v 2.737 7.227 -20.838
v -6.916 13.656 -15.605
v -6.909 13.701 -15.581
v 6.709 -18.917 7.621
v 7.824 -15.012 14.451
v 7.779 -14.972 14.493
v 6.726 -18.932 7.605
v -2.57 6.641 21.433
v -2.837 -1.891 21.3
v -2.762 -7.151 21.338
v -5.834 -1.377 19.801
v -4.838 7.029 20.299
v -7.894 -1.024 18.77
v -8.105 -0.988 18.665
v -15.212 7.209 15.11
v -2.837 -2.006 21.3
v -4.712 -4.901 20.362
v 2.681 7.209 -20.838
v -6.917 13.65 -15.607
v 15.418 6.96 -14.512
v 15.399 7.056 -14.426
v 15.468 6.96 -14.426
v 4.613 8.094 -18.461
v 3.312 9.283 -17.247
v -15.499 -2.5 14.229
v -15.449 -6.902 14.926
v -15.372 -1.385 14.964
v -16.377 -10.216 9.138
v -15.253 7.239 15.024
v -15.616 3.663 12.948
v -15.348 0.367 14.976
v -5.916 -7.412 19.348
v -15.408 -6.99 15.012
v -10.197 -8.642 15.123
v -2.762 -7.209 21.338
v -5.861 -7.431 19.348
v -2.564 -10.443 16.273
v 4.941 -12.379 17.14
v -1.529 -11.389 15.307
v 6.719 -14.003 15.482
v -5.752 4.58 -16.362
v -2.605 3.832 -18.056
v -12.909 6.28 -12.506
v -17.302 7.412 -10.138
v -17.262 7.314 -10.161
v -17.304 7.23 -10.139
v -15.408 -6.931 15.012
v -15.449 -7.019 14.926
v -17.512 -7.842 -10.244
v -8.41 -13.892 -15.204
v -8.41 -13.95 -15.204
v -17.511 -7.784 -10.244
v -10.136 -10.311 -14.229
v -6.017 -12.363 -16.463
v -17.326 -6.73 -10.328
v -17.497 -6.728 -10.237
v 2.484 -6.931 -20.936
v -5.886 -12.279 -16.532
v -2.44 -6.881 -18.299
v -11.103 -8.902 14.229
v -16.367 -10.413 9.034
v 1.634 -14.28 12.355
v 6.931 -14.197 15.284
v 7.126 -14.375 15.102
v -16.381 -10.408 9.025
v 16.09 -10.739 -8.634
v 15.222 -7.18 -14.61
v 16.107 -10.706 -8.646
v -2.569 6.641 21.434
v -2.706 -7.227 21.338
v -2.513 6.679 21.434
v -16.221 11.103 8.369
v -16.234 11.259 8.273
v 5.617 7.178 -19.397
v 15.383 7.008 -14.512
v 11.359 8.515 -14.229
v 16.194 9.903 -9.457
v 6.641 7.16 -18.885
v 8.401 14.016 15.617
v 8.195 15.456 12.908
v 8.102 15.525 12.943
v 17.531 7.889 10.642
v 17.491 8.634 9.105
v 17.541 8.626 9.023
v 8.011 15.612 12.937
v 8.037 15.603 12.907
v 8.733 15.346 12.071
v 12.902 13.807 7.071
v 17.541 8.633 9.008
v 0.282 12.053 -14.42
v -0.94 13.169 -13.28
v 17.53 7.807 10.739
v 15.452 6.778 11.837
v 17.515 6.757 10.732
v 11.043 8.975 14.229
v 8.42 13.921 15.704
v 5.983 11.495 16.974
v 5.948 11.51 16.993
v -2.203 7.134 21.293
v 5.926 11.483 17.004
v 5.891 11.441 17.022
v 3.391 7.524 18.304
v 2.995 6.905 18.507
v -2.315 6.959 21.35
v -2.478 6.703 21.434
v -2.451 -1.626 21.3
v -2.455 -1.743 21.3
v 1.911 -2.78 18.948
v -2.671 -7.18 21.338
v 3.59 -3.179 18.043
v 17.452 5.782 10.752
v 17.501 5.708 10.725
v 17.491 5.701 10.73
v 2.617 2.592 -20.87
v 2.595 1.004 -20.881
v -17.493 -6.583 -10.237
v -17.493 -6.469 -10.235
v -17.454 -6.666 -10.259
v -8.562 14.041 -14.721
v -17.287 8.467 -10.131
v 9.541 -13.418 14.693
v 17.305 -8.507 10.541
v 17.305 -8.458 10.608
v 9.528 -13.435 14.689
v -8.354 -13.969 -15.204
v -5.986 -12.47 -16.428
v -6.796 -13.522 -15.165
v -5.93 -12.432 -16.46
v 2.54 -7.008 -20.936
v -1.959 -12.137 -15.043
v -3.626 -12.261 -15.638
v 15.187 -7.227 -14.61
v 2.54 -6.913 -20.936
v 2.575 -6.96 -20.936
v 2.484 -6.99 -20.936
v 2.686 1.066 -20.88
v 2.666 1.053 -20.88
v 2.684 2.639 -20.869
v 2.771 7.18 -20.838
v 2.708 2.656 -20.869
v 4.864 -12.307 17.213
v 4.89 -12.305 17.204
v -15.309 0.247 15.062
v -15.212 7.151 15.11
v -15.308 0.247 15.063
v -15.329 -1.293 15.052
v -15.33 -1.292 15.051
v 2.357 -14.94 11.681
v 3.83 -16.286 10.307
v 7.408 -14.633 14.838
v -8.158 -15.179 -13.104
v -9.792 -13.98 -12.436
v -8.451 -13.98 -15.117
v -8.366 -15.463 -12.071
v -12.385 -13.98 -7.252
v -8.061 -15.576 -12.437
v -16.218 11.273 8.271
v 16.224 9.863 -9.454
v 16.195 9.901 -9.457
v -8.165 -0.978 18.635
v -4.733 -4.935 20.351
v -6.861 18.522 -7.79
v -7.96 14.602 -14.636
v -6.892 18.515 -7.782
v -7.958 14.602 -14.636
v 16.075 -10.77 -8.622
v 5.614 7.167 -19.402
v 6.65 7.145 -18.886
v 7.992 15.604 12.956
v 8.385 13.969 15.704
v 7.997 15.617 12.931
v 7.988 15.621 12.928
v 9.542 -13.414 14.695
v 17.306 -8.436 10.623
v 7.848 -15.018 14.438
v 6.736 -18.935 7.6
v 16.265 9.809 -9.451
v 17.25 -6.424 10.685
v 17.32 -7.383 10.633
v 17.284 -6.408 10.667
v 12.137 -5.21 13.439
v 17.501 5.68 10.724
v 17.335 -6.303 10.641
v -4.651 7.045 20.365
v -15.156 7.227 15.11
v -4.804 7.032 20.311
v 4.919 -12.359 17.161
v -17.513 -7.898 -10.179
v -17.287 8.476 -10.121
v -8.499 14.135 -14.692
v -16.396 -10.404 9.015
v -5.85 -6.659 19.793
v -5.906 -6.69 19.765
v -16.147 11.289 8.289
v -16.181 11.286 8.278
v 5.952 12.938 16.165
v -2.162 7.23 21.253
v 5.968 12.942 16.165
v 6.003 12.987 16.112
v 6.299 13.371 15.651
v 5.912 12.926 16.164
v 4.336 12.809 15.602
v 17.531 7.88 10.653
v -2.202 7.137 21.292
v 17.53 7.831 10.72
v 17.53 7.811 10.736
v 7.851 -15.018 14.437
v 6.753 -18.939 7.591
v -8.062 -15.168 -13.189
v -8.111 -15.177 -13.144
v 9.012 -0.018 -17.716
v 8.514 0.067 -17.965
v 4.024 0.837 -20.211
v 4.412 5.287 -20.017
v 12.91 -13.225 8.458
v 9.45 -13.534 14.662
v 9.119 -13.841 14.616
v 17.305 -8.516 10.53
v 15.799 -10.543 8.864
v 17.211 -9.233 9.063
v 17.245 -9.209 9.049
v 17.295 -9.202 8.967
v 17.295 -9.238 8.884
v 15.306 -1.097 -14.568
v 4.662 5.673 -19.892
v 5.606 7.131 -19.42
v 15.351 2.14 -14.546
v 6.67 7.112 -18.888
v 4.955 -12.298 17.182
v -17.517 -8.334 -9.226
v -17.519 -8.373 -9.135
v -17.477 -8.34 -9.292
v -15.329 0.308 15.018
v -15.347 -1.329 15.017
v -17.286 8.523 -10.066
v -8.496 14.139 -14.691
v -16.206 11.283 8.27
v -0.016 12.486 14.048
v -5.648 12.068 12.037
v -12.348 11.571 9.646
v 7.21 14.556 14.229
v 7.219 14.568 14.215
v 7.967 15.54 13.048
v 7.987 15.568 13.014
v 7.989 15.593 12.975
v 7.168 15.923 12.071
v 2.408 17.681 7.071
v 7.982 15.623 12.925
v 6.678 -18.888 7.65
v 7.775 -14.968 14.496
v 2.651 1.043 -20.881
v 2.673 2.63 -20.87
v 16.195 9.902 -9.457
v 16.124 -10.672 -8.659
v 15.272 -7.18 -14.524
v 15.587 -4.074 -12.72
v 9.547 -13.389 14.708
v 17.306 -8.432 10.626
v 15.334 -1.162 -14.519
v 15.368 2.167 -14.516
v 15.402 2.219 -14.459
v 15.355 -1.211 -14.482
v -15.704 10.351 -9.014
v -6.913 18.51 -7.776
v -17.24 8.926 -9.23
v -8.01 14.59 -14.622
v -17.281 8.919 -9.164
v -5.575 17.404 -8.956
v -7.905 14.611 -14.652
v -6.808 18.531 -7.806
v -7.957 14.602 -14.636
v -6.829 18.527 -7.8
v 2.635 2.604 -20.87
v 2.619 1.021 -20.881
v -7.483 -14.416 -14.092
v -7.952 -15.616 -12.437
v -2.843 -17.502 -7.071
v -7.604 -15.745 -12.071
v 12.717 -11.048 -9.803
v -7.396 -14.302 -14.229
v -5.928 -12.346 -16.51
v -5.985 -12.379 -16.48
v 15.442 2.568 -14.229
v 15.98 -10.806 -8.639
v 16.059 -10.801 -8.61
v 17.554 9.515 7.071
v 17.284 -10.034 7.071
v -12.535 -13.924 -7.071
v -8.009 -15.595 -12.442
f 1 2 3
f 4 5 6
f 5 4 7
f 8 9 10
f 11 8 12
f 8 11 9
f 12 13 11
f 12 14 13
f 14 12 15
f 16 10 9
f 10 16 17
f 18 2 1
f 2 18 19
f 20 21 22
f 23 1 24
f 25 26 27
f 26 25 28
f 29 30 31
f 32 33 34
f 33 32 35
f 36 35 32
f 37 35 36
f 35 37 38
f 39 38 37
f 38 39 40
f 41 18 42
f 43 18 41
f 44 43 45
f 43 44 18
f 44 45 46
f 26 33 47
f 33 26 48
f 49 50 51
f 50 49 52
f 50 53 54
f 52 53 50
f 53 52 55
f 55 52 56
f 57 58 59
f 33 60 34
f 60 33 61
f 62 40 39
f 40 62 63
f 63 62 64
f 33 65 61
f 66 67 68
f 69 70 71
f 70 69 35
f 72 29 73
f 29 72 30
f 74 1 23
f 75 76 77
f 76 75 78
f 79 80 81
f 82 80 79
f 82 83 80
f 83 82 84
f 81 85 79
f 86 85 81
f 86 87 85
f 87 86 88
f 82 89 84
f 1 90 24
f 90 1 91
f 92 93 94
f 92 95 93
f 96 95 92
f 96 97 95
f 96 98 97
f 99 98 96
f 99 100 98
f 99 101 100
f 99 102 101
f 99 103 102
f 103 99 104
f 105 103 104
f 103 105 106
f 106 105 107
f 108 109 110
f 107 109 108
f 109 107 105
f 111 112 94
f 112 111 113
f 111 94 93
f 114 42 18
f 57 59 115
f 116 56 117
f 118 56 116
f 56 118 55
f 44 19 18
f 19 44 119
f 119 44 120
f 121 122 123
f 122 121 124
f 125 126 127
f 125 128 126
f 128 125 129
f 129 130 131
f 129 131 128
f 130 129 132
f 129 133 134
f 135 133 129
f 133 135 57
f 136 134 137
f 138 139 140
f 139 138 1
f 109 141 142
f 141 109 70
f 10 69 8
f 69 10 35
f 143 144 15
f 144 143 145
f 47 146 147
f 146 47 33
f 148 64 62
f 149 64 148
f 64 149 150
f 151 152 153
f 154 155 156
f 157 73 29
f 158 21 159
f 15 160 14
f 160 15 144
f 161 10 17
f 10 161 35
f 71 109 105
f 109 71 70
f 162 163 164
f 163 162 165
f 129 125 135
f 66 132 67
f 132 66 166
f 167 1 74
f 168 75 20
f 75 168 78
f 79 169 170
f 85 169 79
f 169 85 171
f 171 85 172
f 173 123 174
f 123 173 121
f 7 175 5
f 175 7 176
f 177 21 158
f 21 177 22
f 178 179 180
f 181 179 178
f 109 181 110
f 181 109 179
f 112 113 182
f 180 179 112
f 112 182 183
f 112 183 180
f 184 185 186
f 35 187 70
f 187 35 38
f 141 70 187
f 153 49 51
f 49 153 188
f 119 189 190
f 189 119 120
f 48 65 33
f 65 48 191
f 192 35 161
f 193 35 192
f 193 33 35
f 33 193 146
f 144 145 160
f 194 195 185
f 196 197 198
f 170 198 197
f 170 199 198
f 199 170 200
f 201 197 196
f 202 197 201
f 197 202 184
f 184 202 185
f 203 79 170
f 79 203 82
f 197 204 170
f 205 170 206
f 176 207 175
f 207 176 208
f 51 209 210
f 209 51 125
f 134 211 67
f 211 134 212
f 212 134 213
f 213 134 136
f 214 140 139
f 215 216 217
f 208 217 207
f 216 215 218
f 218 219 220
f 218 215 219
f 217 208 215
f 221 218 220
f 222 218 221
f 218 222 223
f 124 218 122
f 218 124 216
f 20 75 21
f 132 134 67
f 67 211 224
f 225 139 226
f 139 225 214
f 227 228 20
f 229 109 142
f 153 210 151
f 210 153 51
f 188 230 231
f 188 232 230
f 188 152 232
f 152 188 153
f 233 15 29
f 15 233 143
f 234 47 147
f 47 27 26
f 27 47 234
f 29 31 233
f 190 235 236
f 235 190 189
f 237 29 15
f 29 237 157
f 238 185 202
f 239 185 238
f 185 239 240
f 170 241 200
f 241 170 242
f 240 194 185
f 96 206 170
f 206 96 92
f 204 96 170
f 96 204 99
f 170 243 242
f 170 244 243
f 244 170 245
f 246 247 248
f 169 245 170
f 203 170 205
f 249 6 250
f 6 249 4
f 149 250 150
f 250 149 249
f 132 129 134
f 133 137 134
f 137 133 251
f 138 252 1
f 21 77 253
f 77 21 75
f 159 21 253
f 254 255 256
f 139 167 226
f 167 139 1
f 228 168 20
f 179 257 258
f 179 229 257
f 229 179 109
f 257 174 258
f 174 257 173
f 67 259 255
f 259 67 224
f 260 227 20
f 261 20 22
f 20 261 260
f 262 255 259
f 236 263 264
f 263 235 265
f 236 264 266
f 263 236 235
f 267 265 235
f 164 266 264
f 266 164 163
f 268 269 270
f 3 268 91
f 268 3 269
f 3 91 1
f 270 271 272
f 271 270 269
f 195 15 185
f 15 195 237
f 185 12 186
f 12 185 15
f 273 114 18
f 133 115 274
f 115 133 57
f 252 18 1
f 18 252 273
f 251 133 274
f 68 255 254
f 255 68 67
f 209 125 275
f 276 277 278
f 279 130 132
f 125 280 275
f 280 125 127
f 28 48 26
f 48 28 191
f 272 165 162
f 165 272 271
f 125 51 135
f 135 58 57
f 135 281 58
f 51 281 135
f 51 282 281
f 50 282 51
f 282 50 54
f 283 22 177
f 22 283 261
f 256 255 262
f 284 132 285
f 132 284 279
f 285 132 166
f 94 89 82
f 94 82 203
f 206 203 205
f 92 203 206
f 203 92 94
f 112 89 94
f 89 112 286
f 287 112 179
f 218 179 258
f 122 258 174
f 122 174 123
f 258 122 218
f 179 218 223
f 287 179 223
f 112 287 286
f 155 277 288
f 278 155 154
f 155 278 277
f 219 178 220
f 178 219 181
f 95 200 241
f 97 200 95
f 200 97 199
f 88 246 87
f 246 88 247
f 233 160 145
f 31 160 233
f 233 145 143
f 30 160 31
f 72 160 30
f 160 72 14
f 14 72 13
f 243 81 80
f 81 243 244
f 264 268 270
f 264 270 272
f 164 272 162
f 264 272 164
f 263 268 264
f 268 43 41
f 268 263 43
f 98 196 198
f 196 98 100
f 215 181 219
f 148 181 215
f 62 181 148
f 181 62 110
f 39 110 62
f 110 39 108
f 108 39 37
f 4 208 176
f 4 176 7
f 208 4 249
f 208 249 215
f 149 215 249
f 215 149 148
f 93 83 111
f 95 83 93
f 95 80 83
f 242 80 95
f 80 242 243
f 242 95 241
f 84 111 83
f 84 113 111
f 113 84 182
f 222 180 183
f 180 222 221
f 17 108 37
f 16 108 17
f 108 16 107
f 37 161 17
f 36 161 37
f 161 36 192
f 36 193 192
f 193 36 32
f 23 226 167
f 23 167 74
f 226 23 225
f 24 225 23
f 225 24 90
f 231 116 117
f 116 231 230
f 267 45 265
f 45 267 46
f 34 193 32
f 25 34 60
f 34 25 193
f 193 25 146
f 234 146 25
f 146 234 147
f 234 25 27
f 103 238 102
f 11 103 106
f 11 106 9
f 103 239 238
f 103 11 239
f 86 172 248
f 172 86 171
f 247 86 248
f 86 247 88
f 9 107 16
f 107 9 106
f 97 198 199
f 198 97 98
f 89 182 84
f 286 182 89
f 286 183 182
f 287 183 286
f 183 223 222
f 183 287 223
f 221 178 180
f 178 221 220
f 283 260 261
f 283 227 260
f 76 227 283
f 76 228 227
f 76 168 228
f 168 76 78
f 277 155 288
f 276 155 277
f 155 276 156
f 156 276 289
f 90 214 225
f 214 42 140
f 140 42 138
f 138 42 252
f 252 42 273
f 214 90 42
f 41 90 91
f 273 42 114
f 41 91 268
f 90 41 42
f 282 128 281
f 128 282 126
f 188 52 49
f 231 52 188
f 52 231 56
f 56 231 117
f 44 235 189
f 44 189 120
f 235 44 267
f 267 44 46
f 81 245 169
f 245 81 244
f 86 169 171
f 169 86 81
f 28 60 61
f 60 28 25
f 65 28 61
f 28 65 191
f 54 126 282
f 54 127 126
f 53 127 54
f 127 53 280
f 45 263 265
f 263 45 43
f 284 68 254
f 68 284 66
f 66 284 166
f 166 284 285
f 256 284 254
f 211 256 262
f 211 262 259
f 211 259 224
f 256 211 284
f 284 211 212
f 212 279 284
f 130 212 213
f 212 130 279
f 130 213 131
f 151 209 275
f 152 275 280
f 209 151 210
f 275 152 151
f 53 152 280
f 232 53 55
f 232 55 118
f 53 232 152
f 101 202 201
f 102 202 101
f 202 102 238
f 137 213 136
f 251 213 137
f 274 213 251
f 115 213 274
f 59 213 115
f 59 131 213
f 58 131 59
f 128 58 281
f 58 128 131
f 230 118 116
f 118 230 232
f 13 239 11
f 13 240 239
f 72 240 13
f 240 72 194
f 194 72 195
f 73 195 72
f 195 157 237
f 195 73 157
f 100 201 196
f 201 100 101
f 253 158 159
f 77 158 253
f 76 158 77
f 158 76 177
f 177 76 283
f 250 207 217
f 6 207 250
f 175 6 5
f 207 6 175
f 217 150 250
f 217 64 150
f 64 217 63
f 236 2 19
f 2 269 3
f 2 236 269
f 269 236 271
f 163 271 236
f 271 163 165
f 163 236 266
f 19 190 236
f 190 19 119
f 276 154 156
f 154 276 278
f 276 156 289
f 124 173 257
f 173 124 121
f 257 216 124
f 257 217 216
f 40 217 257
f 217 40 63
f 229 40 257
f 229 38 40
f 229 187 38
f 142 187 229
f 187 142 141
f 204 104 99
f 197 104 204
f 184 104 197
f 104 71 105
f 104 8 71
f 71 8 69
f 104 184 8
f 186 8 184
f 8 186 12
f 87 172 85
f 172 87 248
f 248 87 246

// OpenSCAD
// Auto-generated OpenSCAD file

    shift = 0.25;

    inner_points = 10*[[-1.7318858006234514, 0.023907605455431507, -1.4142135623731846], [-1.714980570684405, 1.2485357993167547, -0.7071067811861695], [-1.7487910305625782, -1.2007205884064303, -0.7071067811871046], [-1.7149805706844856, 1.248535799316216, 0.7071067811869255], [-1.748791030562659, -1.2007205884069694, 0.7071067811859905], [-1.7318858006236126, 0.023907605454353924, 1.4142135623730054], [-0.5998355734598786, -1.6248683899966199, -1.4142135623737482], [-0.5491198836427398, 2.04901619158735, 0.7071067811872969], [-0.5829303435207519, -0.4002401961347579, -2.1213203435598285], [-0.5491198836426593, 2.0490161915878886, -0.7071067811857982], [-0.5829303435209935, -0.40024019613637424, 2.1213203435594568], [-0.5998355734600398, -1.6248683899976974, 1.414213562372442], [0.599835573459879, 1.6248683899966216, 1.4142135623737482], [0.5491198836427402, -2.049016191587348, -0.7071067811872969], [0.5829303435207523, 0.4002401961347596, 2.1213203435598285], [0.5491198836426597, -2.049016191587887, 0.7071067811857982], [0.5829303435209939, 0.4002401961363759, -2.1213203435594568], [0.5998355734600402, 1.6248683899976992, -1.414213562372442], [1.7318858006234519, -0.023907605455429876, 1.4142135623731846], [1.7149805706844055, -1.248535799316753, 0.7071067811861695], [1.7487910305625787, 1.200720588406432, 0.7071067811871046], [1.714980570684486, -1.2485357993162143, -0.7071067811869255], [1.7487910305626595, 1.2007205884069712, -0.7071067811859905], [1.731885800623613, -0.023907605454352294, -1.4142135623730054]];

    outer_points_unshifted = 10*[[1.8872103946003194, -0.7399369194726597, 0.9438910327542147], [1.906836077173567, 0.674106390466402, 0.9537068465318261], [1.6923784357468117, -1.4359868196078143, -0.27165618736154307], [1.7316298008933075, 1.392099800270309, -0.2520245598063201], [1.517172159466552, -0.7179934098039071, -1.4773875936996894], [1.5367978420398, 0.6960499001351546, -1.467571779922078], [0.602902554769109, -2.1320367197429686, 0.3015425925479229], [0.661779602488853, 2.1100932100742162, 0.33099003388075743], [0.7977345136226167, -1.4359868196078143, 1.5170898126636807], [0.8369858787691128, 1.392099800270309, 1.5367214402189036], [0.2721156847818378, 0.7179934098039071, -2.1001044063507583], [0.25249000220858975, -0.6960499001351546, -2.1099202201283696], [-0.602902554769109, 2.1320367197429686, -0.3015425925479229], [-0.661779602488853, -2.1100932100742162, -0.33099003388075743], [-0.7977345136226167, 1.4359868196078143, -1.5170898126636807], [-0.8369858787691128, -1.392099800270309, -1.5367214402189036], [-0.2721156847818378, -0.7179934098039071, 2.1001044063507583], [-0.25249000220858975, 0.6960499001351546, 2.1099202201283696], [-1.8872103946003194, 0.7399369194726597, -0.9438910327542147], [-1.906836077173567, -0.674106390466402, -0.9537068465318261], [-1.6923784357468117, 1.4359868196078143, 0.27165618736154307], [-1.7316298008933075, -1.392099800270309, 0.2520245598063201], [-1.517172159466552, 0.7179934098039071, 1.4773875936996894], [-1.5367978420398, -0.6960499001351546, 1.467571779922078]];
    
    outer_points = [for (p = outer_points_unshifted) [p[0], p[1], p[2] + shift]];

    // Convex hull for inner set (I)
    module inner_hull() {
        hull() {
            for (p = inner_points) {
                translate(p) sphere(r=0.1);
            }
        }
    }

    // Convex hull for outer set (O) minus inner hull (O \ I)
    module outer_minus_inner() {
        difference() {
            hull() {
                for (p = outer_points) {
                    translate(p) sphere(r=0.1);
                }
            }
            inner_hull(); // Subtract inner hull
        }
    }

    // Convex hull for outer set (O) minus all translated inner hulls
    module outer_minus_AllTranslationInner() {
        difference() {
            hull() {
                for (p = outer_points) {
                    translate(p) sphere(r=0.1);
                }
            }
            hull() {
                translate([0,0,5]) inner_hull();
                translate([0,0,-5]) inner_hull();
            }; // Subtract translated inner hulls
        }
    }

    // Difference between outer_minus_inner and outer_minus_AllTranslationInner
    module outer_minus_inner_diff() {
        difference() {
            // Outer minus inner
            difference() {
                hull() {
                    for (p = outer_points) {
                        translate(p) sphere(r=0.1);
                    }
                }
                inner_hull();
            }

            // Subtract Outer minus AllTranslationInner
            difference() {
                hull() {
                    for (p = outer_points) {
                        translate(p) sphere(r=0.1);
                    }
                }
                hull() {
                    translate([0,0,5]) inner_hull();
                    translate([0,0,-5]) inner_hull();
                };
            }
        }
    }

    // Rendering all with colors applied
    // color([1, 0, 0, 0.5]) inner_hull(); // Transparent red
    // color([0, 1, 0, 1]) outer_minus_AllTranslationInner(); // Opaque green
    color([1, 1, 0, 1]) outer_minus_inner_diff(); // Opaque yellow
    
